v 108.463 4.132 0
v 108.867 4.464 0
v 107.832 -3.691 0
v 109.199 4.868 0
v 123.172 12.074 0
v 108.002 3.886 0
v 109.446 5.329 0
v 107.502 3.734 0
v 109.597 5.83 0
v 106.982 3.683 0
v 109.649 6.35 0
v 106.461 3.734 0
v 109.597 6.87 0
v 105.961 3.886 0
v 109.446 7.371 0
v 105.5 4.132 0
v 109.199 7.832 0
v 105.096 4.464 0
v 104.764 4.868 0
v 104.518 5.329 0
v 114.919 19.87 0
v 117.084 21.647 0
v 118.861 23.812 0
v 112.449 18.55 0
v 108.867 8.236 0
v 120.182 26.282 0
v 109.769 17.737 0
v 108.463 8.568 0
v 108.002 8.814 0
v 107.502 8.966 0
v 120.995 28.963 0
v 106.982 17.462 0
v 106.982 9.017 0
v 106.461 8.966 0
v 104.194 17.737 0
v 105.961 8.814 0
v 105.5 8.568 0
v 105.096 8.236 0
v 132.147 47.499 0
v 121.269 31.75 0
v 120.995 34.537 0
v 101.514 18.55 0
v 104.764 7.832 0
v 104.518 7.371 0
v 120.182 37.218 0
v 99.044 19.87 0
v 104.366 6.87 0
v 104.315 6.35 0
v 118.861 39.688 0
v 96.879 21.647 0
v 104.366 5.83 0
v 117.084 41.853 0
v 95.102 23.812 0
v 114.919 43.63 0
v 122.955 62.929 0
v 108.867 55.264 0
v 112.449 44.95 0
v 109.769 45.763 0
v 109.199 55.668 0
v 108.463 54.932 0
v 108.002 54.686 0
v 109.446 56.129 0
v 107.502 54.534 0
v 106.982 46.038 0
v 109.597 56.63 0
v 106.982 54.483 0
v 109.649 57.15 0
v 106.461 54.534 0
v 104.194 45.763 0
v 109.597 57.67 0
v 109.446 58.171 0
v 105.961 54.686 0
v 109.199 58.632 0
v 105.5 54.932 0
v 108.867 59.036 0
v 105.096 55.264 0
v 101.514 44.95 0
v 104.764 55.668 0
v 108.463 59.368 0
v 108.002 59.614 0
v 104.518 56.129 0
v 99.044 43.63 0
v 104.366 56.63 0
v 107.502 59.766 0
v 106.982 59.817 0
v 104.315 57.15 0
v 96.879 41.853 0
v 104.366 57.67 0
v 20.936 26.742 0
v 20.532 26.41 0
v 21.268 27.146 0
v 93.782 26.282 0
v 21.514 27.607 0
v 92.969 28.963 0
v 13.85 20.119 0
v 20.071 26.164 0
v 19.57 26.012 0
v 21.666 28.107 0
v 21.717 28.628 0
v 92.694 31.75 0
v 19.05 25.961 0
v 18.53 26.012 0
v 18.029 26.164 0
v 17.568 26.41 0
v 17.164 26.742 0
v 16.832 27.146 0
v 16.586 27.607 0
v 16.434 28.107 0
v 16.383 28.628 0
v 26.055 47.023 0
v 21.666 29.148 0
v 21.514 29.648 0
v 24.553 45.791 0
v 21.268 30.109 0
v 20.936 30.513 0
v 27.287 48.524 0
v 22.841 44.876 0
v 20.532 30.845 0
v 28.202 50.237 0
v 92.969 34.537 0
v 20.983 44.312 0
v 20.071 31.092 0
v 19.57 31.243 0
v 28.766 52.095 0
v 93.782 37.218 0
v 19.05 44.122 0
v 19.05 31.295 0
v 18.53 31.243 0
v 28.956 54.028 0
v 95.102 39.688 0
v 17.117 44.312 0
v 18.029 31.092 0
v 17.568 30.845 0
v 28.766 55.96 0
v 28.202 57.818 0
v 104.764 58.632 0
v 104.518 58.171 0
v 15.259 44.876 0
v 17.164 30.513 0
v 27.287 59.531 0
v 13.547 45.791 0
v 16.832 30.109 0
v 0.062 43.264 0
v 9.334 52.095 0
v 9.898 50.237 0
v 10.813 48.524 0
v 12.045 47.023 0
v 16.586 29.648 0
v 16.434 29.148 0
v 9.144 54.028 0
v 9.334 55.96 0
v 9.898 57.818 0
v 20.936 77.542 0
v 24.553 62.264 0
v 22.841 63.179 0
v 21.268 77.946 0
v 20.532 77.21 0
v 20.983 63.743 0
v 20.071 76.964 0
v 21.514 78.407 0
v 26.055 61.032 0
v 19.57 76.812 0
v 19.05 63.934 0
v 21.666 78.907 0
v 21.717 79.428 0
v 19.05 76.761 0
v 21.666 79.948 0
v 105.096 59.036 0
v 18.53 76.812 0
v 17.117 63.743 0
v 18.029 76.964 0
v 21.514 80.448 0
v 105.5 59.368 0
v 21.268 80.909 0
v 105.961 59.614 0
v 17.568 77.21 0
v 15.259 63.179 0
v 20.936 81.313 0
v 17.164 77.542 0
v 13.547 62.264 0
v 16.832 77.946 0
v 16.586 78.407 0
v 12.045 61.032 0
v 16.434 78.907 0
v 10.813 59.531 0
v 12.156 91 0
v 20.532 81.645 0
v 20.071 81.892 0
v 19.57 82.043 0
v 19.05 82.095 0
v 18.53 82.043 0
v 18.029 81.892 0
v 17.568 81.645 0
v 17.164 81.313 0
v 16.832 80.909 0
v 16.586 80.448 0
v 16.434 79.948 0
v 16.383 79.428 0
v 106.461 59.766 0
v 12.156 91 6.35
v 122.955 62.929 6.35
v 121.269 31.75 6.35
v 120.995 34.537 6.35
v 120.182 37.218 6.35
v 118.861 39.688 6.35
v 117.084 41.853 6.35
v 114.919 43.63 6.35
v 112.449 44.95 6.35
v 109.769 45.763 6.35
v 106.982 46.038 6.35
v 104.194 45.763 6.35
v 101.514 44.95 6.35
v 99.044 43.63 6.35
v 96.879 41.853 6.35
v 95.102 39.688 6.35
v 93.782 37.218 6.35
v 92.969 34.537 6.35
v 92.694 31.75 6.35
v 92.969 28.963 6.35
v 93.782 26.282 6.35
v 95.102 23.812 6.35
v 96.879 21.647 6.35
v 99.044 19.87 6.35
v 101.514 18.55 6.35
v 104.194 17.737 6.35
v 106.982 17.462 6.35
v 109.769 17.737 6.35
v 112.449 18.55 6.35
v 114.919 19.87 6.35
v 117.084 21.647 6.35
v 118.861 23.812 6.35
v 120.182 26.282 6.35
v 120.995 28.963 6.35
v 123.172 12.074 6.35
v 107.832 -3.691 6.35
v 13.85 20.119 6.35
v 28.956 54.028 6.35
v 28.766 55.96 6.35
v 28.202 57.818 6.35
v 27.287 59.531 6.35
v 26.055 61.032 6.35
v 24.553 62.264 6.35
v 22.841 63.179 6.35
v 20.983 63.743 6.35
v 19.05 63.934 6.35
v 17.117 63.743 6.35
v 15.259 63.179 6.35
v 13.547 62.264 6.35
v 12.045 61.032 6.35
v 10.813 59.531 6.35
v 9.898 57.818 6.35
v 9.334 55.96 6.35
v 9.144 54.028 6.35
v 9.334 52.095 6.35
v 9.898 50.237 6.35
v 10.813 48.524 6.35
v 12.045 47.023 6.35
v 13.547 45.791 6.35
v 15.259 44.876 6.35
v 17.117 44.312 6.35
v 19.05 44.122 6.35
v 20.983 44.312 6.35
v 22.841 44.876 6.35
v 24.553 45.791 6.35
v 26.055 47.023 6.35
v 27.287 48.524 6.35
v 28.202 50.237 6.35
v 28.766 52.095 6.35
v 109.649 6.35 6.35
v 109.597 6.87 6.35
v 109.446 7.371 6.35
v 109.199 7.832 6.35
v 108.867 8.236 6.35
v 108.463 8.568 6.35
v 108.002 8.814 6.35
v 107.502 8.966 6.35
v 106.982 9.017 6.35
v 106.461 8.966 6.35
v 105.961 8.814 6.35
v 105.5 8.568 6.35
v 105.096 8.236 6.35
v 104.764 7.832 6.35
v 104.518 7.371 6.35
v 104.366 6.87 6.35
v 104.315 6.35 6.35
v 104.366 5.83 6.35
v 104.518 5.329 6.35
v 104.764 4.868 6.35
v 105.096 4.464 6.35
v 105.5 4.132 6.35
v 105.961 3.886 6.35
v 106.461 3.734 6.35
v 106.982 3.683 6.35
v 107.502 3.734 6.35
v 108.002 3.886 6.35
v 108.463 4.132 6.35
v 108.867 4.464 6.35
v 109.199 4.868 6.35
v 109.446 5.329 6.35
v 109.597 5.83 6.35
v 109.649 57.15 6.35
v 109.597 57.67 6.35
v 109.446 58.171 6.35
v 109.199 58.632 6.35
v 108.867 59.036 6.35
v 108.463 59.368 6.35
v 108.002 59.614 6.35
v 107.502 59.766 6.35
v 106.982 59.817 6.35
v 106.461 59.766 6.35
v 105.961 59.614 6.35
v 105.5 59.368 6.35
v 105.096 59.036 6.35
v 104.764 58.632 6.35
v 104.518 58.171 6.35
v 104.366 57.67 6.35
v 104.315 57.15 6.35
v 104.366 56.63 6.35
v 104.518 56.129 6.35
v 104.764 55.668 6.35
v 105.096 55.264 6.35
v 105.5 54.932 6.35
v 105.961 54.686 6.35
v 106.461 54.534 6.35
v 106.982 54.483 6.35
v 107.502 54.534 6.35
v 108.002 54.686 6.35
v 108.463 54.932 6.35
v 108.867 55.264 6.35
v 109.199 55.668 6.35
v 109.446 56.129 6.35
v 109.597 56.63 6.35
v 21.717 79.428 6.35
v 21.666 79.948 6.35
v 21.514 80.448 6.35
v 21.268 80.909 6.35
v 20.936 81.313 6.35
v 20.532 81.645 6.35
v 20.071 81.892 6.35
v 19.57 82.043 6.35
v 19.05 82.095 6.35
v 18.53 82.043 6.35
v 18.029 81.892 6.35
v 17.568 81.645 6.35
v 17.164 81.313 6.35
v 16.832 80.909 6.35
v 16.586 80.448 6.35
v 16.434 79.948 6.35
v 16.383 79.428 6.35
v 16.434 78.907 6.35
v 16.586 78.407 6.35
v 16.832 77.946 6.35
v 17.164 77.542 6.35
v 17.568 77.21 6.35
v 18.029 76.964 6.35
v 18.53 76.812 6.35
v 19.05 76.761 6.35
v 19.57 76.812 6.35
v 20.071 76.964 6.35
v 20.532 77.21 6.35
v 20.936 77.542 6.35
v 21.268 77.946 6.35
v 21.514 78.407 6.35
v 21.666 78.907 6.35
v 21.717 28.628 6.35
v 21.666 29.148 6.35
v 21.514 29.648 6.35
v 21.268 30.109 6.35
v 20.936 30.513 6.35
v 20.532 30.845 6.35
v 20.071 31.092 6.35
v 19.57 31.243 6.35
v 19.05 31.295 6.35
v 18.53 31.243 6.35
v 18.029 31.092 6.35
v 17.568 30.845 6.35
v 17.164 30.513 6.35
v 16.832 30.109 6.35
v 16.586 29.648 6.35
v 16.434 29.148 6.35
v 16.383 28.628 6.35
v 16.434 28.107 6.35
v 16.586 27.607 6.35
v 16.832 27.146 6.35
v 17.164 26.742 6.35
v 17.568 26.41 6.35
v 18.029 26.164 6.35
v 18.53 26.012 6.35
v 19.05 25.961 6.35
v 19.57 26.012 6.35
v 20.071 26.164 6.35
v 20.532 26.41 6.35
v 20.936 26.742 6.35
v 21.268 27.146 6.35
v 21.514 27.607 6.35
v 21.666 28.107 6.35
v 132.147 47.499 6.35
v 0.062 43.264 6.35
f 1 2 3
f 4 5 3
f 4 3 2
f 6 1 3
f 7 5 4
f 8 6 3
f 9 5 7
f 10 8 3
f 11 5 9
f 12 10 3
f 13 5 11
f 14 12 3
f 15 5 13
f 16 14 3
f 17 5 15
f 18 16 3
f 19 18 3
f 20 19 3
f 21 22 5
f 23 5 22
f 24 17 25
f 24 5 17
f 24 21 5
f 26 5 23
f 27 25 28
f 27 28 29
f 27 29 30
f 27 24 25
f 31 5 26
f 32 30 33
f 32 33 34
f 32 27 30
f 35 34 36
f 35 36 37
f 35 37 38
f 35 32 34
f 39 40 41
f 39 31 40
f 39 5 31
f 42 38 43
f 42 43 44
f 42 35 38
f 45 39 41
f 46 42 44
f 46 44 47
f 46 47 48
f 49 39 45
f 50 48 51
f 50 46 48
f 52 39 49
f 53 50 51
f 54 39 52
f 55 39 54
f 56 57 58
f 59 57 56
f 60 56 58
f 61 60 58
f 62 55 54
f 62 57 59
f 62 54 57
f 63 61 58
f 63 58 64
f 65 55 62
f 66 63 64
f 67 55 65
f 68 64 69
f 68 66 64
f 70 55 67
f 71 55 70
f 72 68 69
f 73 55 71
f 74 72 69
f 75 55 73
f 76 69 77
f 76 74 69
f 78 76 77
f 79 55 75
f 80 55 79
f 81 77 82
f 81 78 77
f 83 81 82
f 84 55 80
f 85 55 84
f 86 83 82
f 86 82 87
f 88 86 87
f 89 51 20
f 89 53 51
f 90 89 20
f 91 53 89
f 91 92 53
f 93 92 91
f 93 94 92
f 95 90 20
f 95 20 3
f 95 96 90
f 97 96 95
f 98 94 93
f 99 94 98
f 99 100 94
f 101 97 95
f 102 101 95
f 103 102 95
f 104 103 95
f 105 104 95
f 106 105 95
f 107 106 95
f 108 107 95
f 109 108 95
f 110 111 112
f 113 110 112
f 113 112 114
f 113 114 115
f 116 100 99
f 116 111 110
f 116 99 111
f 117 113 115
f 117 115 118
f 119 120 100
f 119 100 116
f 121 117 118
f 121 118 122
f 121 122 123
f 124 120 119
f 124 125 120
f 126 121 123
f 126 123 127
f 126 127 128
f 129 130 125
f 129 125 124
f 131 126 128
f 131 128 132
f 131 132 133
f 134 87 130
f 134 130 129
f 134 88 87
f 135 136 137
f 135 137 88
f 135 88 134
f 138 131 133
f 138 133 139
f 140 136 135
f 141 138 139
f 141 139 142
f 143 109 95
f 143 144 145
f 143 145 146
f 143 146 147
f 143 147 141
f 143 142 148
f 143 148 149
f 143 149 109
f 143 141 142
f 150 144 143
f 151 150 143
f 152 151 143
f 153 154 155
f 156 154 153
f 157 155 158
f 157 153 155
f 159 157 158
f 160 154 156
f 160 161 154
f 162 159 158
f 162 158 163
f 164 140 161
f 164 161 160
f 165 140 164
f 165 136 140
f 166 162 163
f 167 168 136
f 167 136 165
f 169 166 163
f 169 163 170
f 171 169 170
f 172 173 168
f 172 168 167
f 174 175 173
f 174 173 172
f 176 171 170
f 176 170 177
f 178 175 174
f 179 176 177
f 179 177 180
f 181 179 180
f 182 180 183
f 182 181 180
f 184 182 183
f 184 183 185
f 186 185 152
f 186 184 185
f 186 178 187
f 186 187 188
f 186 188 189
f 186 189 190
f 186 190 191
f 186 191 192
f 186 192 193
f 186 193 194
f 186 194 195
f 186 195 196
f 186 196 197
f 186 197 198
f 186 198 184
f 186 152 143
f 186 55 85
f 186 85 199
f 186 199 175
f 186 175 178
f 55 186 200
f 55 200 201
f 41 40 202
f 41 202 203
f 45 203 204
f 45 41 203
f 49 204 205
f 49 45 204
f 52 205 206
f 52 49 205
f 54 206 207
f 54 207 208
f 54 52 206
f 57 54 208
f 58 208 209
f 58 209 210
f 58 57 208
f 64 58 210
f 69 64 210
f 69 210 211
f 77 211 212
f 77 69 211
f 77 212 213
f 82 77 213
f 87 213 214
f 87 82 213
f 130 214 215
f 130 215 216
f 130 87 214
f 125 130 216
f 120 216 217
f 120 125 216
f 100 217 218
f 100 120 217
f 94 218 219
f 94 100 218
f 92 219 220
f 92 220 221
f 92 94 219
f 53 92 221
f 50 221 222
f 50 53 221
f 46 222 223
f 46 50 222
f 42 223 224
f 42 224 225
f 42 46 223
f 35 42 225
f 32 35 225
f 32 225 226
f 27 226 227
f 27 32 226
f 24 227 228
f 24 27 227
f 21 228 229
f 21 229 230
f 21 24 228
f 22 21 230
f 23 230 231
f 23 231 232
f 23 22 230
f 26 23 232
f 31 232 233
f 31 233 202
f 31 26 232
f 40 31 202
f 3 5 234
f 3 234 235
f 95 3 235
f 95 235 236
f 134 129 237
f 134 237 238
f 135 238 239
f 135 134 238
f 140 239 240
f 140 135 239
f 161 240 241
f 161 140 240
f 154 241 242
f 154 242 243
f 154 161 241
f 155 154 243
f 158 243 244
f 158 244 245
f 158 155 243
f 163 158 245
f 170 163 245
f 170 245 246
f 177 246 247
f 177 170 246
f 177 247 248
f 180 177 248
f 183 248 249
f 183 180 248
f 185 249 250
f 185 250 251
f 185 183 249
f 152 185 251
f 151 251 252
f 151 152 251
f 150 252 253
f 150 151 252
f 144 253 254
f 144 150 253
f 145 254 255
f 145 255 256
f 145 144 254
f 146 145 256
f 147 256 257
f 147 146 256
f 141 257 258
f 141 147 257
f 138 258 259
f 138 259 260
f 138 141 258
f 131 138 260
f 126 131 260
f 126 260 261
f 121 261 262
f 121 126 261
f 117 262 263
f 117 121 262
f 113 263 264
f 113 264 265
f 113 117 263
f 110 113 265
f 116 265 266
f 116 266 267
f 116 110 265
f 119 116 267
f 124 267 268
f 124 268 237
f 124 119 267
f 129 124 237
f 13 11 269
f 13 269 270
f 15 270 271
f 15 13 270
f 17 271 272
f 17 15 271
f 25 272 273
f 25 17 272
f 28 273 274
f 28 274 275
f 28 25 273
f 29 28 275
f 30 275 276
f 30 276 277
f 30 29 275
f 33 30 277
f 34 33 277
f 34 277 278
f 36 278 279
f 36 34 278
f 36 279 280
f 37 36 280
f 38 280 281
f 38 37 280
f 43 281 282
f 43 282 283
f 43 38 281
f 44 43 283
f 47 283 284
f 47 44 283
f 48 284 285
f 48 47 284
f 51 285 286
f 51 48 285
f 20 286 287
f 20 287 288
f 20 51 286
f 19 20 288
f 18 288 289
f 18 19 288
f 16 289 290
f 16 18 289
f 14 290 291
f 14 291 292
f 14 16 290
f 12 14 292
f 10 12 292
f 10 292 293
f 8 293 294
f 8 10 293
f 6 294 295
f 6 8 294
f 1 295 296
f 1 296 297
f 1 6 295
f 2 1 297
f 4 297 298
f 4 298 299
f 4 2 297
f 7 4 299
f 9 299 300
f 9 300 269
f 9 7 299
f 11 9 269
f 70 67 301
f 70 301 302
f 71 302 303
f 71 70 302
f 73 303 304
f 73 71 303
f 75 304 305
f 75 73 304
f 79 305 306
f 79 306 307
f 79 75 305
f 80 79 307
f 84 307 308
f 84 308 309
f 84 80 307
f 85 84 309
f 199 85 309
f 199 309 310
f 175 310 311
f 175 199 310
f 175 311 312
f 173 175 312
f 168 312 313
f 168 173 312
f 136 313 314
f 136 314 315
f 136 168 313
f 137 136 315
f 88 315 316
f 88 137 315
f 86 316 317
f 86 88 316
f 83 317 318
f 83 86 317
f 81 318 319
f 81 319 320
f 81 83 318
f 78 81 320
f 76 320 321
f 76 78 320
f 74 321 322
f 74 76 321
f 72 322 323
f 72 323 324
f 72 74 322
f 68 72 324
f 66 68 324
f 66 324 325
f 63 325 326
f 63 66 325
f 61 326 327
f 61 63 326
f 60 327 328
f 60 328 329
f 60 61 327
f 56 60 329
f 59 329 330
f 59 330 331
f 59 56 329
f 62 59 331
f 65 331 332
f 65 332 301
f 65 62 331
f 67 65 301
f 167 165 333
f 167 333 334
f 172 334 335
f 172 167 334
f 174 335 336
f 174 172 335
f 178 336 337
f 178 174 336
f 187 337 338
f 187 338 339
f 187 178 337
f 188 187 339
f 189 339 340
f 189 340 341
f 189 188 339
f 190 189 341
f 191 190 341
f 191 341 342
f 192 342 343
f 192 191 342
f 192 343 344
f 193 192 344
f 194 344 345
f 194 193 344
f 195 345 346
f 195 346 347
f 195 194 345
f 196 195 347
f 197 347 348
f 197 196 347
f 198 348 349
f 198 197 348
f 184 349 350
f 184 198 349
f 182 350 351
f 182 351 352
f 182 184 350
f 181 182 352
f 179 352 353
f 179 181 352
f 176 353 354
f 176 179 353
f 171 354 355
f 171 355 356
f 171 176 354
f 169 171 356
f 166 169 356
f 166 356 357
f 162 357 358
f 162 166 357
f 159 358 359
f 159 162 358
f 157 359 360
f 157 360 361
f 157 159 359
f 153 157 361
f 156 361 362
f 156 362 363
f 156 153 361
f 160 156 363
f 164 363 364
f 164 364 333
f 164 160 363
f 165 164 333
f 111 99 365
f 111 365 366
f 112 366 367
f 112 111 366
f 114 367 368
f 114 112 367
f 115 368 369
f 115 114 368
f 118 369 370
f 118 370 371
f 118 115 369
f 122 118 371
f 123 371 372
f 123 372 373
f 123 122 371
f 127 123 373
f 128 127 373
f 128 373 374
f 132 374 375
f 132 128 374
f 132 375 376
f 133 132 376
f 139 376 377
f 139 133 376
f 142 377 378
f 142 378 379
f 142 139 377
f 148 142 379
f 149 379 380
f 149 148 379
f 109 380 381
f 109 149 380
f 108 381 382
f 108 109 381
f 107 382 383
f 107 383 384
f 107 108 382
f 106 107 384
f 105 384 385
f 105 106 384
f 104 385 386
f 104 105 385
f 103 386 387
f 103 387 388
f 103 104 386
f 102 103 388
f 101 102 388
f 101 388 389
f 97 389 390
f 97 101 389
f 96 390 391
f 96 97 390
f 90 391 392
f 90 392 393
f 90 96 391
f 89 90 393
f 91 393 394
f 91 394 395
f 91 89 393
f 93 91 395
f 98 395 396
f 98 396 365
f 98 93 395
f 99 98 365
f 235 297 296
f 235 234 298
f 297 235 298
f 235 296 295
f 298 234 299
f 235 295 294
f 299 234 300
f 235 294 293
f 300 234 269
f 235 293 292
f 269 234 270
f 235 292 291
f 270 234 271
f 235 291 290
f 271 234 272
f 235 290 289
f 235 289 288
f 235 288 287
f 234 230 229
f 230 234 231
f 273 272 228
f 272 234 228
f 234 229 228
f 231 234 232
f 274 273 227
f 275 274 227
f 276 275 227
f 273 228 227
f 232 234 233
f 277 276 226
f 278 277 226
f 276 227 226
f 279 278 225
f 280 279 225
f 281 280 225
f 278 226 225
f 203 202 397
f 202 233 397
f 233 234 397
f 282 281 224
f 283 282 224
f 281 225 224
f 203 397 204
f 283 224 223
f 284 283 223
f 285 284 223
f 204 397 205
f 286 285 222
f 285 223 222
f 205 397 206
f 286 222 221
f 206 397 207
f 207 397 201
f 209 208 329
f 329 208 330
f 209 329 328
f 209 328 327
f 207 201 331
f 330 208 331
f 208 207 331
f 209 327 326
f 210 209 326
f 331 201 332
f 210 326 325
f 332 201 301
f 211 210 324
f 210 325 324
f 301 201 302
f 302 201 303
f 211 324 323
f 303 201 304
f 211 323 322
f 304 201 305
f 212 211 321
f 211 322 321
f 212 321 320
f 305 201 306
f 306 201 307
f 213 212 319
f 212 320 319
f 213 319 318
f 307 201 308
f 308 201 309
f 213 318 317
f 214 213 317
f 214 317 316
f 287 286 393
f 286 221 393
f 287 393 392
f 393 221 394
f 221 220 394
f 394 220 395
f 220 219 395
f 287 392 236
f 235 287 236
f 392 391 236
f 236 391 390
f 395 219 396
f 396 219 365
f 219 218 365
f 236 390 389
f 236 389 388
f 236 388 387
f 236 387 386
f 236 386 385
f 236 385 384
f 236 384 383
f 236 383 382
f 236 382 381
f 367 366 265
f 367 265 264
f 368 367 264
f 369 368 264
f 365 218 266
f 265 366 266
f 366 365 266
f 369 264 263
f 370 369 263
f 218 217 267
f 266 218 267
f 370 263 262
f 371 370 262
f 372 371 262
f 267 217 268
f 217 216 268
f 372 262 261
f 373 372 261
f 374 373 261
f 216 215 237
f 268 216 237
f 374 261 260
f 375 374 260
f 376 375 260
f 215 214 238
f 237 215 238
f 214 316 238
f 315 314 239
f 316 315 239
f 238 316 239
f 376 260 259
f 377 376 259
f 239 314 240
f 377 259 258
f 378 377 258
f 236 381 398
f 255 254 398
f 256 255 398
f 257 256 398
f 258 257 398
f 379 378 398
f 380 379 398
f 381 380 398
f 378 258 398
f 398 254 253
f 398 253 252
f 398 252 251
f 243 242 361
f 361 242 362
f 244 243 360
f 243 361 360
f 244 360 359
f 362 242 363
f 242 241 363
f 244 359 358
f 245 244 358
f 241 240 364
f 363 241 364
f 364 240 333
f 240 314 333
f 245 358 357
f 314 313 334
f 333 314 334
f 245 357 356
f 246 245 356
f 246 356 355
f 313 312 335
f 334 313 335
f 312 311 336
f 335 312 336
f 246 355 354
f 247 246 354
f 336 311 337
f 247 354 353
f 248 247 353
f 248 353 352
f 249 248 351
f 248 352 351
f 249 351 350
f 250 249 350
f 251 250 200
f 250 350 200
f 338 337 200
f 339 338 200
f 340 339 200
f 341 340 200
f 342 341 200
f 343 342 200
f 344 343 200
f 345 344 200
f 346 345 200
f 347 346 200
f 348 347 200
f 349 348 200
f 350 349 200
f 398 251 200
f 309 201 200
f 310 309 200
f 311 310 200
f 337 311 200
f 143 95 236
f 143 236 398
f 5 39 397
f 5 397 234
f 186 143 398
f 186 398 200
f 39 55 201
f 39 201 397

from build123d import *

# Parameters (mm, degrees)
SKETCH1_R           = 9.906
SKETCH1_R_2         = 14.2875
SKETCH1_R_3         = 2.667
BOSS_EXTRUDE1_DEPTH = 6.35


with BuildPart() as part:
    # Sketch1 → Boss-Extrude1 (new body)
    with BuildSketch(Plane.XY):
        Polygon((12.15597468, 91.000063132), (122.95536215, 62.928979497), (132.147395909, 47.498927153), (123.172465774, 12.073976179), (107.832275805, -3.691447117), (13.850085892, 20.118990589), (0.062035253, 43.264069106), align=None)
        with Locations((19.05, 54.027523873)):
            Circle(SKETCH1_R, mode=Mode.SUBTRACT)
        with Locations((106.981625, 31.75)):
            Circle(SKETCH1_R_2, mode=Mode.SUBTRACT)
        with Locations((106.981625, 57.15)):
            Circle(SKETCH1_R_3, mode=Mode.SUBTRACT)
        with Locations((106.981625, 6.35)):
            Circle(SKETCH1_R_3, mode=Mode.SUBTRACT)
        with Locations((19.05, 79.427523873)):
            Circle(SKETCH1_R_3, mode=Mode.SUBTRACT)
        with Locations((19.05, 28.627523873)):
            Circle(SKETCH1_R_3, mode=Mode.SUBTRACT)
    extrude(amount=BOSS_EXTRUDE1_DEPTH)


solid = part.part
